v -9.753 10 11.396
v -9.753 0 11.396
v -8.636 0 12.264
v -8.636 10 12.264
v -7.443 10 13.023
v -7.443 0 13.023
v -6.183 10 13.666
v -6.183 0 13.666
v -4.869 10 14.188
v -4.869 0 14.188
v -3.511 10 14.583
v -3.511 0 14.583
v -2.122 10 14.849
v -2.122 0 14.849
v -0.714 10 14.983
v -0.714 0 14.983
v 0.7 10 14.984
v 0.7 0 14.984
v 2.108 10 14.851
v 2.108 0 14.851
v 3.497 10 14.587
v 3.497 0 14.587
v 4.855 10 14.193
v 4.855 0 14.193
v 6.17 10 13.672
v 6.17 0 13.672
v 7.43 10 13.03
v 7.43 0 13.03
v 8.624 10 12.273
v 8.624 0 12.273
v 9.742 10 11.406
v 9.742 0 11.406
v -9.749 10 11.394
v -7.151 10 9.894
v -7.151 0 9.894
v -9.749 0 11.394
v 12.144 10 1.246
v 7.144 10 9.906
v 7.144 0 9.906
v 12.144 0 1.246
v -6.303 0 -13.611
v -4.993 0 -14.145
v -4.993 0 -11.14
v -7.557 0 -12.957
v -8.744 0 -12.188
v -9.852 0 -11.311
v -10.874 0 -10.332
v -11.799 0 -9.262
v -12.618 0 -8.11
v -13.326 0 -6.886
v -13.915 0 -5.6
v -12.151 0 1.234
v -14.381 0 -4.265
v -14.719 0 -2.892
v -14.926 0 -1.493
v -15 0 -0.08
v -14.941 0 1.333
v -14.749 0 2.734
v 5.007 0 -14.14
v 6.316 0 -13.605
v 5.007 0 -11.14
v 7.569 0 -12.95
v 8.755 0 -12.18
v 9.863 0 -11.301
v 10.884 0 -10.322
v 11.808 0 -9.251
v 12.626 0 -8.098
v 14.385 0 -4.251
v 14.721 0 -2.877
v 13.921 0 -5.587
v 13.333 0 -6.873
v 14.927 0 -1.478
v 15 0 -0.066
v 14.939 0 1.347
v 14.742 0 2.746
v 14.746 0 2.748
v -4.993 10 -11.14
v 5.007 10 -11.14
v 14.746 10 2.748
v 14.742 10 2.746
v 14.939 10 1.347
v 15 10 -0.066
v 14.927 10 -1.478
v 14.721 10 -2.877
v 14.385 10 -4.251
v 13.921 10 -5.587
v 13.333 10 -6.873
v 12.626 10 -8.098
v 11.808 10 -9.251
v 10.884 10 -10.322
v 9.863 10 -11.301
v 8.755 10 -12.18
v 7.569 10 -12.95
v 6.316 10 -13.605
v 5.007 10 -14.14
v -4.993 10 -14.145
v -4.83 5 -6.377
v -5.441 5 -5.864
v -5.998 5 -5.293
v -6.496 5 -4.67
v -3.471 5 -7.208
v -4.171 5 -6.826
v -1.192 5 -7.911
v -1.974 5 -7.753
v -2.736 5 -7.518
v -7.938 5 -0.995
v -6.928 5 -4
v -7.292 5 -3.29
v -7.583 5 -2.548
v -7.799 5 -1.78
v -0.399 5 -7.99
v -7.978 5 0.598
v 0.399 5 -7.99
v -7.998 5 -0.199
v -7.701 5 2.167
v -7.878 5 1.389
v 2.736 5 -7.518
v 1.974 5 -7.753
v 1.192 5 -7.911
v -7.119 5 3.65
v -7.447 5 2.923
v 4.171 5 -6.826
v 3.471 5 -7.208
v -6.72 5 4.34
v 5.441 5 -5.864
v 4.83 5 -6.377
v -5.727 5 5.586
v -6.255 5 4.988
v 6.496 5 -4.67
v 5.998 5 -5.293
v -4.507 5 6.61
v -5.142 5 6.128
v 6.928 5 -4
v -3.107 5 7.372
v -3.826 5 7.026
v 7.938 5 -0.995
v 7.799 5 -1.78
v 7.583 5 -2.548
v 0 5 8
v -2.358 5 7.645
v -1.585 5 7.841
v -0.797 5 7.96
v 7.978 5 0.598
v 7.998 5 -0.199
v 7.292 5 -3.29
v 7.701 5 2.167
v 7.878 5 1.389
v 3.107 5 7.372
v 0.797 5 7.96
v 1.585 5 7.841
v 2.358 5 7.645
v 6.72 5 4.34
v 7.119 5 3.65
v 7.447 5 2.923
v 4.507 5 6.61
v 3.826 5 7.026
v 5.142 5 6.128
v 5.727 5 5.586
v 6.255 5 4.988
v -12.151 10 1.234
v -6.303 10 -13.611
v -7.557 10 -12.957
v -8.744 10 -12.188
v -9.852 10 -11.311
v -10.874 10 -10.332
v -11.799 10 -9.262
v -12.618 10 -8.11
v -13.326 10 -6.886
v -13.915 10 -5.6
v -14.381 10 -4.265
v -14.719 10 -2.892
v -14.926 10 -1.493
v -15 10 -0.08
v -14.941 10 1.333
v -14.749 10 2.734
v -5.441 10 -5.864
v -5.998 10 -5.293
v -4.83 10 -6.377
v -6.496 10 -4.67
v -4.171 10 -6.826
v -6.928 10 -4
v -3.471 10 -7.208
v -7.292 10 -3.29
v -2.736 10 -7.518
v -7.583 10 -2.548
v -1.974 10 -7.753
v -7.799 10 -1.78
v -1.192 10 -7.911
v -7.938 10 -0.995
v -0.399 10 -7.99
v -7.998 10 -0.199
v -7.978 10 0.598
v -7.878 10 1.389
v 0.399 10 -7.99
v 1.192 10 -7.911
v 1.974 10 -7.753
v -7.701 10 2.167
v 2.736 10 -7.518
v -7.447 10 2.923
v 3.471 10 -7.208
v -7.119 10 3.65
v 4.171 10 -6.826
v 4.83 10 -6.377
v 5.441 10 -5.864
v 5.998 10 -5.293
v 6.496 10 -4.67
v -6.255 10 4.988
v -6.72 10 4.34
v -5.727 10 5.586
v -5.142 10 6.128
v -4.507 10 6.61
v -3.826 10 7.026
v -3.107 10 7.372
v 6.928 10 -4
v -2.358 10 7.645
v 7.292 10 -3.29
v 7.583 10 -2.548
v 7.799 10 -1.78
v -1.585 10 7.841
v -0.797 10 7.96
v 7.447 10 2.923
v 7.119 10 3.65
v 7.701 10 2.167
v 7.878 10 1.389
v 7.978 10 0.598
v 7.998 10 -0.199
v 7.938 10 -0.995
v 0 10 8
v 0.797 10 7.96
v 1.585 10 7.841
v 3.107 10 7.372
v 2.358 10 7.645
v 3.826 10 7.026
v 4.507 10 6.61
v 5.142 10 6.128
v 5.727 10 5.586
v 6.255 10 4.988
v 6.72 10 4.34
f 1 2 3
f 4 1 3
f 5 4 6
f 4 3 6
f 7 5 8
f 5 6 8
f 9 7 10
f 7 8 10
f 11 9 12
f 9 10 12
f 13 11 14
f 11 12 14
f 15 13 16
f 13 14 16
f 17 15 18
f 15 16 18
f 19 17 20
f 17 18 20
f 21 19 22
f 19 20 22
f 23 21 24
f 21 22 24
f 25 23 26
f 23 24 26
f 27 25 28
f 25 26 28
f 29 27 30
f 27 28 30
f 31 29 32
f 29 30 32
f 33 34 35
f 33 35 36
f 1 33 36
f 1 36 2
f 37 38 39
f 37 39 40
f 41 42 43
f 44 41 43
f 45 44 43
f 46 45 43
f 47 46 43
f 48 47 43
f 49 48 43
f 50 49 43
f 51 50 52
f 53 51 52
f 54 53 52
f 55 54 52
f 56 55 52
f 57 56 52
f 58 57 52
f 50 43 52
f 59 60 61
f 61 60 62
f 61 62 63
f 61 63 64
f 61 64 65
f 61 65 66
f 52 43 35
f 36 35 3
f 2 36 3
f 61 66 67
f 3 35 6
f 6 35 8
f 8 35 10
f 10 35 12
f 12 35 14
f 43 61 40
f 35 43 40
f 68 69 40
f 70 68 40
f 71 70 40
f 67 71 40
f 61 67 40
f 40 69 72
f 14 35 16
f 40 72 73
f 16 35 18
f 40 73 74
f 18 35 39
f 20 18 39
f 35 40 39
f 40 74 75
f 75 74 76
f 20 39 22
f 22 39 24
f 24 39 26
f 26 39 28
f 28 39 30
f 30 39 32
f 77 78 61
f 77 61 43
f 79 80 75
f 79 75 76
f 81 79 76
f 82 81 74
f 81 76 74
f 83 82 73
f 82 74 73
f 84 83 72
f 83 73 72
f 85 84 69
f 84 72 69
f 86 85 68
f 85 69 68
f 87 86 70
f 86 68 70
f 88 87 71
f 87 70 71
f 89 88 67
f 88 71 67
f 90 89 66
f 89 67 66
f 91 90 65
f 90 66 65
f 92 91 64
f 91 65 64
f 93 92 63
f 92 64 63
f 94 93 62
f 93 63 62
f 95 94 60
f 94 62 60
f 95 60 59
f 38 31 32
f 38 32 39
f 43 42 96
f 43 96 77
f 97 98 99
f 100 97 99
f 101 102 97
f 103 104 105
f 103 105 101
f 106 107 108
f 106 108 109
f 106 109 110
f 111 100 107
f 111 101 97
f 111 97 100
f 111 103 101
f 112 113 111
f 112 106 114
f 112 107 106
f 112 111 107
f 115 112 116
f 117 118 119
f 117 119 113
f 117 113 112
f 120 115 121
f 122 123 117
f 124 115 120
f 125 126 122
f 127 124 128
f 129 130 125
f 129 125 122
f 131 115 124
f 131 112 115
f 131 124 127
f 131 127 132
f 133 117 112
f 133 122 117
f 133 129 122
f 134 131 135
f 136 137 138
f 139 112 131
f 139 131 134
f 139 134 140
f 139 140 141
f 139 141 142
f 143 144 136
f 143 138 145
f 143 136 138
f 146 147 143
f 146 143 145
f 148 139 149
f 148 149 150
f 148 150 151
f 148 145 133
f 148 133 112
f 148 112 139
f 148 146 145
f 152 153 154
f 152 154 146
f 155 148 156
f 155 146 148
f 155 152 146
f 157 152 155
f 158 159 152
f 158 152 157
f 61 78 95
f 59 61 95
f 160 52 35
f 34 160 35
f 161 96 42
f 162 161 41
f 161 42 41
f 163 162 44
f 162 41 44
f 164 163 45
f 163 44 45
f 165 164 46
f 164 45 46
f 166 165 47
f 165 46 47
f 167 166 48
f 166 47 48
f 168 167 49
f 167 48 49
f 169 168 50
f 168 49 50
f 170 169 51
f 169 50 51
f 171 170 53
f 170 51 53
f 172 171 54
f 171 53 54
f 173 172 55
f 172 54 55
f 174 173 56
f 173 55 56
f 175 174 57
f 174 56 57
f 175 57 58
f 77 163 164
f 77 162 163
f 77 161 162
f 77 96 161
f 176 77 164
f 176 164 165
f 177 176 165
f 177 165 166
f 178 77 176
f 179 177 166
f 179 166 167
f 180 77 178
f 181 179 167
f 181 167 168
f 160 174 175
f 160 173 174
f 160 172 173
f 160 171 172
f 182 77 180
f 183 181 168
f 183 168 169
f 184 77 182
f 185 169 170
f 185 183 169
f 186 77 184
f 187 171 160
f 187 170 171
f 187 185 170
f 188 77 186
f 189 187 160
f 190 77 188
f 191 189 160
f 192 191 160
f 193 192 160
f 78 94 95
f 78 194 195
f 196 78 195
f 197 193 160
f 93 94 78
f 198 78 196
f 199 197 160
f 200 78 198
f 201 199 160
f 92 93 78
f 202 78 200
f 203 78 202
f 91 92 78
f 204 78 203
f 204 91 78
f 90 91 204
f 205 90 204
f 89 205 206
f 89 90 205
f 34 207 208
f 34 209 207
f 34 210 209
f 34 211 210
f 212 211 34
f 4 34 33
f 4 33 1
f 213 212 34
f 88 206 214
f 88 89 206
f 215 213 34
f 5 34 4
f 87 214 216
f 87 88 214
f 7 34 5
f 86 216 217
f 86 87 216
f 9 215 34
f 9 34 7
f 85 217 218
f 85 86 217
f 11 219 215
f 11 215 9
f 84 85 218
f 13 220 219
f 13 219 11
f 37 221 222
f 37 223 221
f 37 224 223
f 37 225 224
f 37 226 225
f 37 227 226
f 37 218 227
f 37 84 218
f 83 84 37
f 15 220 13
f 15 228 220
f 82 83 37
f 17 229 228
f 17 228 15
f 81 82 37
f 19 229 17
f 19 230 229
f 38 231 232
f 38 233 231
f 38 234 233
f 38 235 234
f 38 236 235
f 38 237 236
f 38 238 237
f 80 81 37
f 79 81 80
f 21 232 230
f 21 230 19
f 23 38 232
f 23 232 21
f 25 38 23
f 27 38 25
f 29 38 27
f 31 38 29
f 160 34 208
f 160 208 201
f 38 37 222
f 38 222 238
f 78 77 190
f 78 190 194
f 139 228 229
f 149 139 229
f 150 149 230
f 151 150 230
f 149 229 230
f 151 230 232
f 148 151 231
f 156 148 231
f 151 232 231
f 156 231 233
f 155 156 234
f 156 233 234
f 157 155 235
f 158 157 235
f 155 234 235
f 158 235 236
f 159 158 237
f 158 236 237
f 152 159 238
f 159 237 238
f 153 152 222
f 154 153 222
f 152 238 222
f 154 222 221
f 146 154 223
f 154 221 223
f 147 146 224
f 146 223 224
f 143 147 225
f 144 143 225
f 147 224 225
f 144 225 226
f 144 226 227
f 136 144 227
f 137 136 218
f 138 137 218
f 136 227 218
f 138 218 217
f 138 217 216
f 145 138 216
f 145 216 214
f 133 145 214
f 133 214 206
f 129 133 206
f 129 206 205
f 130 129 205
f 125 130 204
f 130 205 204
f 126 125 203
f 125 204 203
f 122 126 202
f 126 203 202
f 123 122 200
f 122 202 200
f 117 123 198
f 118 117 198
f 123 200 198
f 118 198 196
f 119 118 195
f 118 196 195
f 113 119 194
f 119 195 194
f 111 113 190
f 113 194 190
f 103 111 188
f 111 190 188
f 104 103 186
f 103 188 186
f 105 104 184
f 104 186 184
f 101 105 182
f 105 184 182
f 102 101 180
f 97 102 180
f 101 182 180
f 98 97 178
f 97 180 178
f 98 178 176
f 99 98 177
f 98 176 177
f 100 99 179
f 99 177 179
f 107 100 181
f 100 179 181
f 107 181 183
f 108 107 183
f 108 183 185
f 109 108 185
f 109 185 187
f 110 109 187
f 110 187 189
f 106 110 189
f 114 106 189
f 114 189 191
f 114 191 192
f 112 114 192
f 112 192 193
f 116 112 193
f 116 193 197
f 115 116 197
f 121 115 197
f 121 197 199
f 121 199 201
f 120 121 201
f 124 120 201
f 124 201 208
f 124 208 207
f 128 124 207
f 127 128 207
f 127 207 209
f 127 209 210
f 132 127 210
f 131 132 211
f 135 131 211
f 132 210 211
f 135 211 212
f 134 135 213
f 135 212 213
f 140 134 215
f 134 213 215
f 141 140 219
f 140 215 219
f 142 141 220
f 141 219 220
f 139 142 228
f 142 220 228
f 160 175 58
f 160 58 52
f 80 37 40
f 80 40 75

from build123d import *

# Parameters (mm, degrees)
SKETCH1_R           = 15
BOSS_EXTRUDE1_DEPTH = 10
SKETCH2_R           = 8
CUT_EXTRUDE1_DEPTH  = 5
CUT_EXTRUDE2_REACH  = 25.452


with BuildPart() as part:
    # Sketch1 → Boss-Extrude1 (new body)
    with BuildSketch(Plane(origin=(0, 0, 0), x_dir=(1, 0, 0), z_dir=(0, 1, 0))):
        with Locations(Location((0, 0, 0), (0, 0, 270))):
            Circle(SKETCH1_R)
    extrude(amount=BOSS_EXTRUDE1_DEPTH)

    # Sketch2 → Cut-Extrude1 (cut)
    with BuildSketch(Plane(origin=(0, 10, 0), x_dir=(1, 0, 0), z_dir=(0, 1, 0))):
        with Locations(Location((0, 0, 0), (0, 0, 270))):
            Circle(SKETCH2_R)
    extrude(amount=-CUT_EXTRUDE1_DEPTH, mode=Mode.SUBTRACT)

    # Sketch3 → Cut-Extrude2 (cut, up to next)
    with BuildSketch(Plane(origin=(0, 10, 0), x_dir=(1, 0, 0), z_dir=(0, 1, 0)), mode=Mode.PRIVATE) as cut_extrude2_sk1:
        Polygon((-4.993128311, 14.139704236), (-4.993128311, 16.53849836), (5.006871689, 16.53849836), (5.006871689, 14.139704236), (5.006871689, 11.139704236), (-4.993128311, 11.139704236), align=None)
    cut_extrude2_tool1 = extrude(cut_extrude2_sk1.sketch, amount=-CUT_EXTRUDE2_REACH, mode=Mode.PRIVATE) & part.part
    # Sketch3 → Cut-Extrude2 (cut, up to next)
    with BuildSketch(Plane(origin=(0, 10, 0), x_dir=(1, 0, 0), z_dir=(0, 1, 0)), mode=Mode.PRIVATE) as cut_extrude2_sk2:
        Polygon((9.741907226, -11.405930195), (7.143831014, -9.905930195), (12.143831014, -1.245676157), (14.741907226, -2.745676157), (16.819323876, -3.945073219), (11.819323876, -12.605327257), align=None)
    cut_extrude2_tool2 = extrude(cut_extrude2_sk2.sketch, amount=-CUT_EXTRUDE2_REACH, mode=Mode.PRIVATE) & part.part
    # Sketch3 → Cut-Extrude2 (cut, up to next)
    with BuildSketch(Plane(origin=(0, 10, 0), x_dir=(1, 0, 0), z_dir=(0, 1, 0)), mode=Mode.PRIVATE) as cut_extrude2_sk3:
        Polygon((-14.748778915, -2.733774042), (-12.150702704, -1.233774042), (-7.150702704, -9.894028079), (-9.748778915, -11.394028079), (-11.826195565, -12.593425141), (-16.826195565, -3.933171104), align=None)
    cut_extrude2_tool3 = extrude(cut_extrude2_sk3.sketch, amount=-CUT_EXTRUDE2_REACH, mode=Mode.PRIVATE) & part.part
    add(cut_extrude2_tool1.solids().sort_by_distance((0.006872, 10, -13.839101))[0], mode=Mode.SUBTRACT)
    add(cut_extrude2_tool2.solids().sort_by_distance((11.981577, 10, 6.925502))[0], mode=Mode.SUBTRACT)
    add(cut_extrude2_tool3.solids().sort_by_distance((-11.988449, 10, 6.9136))[0], mode=Mode.SUBTRACT)


solid = part.part
